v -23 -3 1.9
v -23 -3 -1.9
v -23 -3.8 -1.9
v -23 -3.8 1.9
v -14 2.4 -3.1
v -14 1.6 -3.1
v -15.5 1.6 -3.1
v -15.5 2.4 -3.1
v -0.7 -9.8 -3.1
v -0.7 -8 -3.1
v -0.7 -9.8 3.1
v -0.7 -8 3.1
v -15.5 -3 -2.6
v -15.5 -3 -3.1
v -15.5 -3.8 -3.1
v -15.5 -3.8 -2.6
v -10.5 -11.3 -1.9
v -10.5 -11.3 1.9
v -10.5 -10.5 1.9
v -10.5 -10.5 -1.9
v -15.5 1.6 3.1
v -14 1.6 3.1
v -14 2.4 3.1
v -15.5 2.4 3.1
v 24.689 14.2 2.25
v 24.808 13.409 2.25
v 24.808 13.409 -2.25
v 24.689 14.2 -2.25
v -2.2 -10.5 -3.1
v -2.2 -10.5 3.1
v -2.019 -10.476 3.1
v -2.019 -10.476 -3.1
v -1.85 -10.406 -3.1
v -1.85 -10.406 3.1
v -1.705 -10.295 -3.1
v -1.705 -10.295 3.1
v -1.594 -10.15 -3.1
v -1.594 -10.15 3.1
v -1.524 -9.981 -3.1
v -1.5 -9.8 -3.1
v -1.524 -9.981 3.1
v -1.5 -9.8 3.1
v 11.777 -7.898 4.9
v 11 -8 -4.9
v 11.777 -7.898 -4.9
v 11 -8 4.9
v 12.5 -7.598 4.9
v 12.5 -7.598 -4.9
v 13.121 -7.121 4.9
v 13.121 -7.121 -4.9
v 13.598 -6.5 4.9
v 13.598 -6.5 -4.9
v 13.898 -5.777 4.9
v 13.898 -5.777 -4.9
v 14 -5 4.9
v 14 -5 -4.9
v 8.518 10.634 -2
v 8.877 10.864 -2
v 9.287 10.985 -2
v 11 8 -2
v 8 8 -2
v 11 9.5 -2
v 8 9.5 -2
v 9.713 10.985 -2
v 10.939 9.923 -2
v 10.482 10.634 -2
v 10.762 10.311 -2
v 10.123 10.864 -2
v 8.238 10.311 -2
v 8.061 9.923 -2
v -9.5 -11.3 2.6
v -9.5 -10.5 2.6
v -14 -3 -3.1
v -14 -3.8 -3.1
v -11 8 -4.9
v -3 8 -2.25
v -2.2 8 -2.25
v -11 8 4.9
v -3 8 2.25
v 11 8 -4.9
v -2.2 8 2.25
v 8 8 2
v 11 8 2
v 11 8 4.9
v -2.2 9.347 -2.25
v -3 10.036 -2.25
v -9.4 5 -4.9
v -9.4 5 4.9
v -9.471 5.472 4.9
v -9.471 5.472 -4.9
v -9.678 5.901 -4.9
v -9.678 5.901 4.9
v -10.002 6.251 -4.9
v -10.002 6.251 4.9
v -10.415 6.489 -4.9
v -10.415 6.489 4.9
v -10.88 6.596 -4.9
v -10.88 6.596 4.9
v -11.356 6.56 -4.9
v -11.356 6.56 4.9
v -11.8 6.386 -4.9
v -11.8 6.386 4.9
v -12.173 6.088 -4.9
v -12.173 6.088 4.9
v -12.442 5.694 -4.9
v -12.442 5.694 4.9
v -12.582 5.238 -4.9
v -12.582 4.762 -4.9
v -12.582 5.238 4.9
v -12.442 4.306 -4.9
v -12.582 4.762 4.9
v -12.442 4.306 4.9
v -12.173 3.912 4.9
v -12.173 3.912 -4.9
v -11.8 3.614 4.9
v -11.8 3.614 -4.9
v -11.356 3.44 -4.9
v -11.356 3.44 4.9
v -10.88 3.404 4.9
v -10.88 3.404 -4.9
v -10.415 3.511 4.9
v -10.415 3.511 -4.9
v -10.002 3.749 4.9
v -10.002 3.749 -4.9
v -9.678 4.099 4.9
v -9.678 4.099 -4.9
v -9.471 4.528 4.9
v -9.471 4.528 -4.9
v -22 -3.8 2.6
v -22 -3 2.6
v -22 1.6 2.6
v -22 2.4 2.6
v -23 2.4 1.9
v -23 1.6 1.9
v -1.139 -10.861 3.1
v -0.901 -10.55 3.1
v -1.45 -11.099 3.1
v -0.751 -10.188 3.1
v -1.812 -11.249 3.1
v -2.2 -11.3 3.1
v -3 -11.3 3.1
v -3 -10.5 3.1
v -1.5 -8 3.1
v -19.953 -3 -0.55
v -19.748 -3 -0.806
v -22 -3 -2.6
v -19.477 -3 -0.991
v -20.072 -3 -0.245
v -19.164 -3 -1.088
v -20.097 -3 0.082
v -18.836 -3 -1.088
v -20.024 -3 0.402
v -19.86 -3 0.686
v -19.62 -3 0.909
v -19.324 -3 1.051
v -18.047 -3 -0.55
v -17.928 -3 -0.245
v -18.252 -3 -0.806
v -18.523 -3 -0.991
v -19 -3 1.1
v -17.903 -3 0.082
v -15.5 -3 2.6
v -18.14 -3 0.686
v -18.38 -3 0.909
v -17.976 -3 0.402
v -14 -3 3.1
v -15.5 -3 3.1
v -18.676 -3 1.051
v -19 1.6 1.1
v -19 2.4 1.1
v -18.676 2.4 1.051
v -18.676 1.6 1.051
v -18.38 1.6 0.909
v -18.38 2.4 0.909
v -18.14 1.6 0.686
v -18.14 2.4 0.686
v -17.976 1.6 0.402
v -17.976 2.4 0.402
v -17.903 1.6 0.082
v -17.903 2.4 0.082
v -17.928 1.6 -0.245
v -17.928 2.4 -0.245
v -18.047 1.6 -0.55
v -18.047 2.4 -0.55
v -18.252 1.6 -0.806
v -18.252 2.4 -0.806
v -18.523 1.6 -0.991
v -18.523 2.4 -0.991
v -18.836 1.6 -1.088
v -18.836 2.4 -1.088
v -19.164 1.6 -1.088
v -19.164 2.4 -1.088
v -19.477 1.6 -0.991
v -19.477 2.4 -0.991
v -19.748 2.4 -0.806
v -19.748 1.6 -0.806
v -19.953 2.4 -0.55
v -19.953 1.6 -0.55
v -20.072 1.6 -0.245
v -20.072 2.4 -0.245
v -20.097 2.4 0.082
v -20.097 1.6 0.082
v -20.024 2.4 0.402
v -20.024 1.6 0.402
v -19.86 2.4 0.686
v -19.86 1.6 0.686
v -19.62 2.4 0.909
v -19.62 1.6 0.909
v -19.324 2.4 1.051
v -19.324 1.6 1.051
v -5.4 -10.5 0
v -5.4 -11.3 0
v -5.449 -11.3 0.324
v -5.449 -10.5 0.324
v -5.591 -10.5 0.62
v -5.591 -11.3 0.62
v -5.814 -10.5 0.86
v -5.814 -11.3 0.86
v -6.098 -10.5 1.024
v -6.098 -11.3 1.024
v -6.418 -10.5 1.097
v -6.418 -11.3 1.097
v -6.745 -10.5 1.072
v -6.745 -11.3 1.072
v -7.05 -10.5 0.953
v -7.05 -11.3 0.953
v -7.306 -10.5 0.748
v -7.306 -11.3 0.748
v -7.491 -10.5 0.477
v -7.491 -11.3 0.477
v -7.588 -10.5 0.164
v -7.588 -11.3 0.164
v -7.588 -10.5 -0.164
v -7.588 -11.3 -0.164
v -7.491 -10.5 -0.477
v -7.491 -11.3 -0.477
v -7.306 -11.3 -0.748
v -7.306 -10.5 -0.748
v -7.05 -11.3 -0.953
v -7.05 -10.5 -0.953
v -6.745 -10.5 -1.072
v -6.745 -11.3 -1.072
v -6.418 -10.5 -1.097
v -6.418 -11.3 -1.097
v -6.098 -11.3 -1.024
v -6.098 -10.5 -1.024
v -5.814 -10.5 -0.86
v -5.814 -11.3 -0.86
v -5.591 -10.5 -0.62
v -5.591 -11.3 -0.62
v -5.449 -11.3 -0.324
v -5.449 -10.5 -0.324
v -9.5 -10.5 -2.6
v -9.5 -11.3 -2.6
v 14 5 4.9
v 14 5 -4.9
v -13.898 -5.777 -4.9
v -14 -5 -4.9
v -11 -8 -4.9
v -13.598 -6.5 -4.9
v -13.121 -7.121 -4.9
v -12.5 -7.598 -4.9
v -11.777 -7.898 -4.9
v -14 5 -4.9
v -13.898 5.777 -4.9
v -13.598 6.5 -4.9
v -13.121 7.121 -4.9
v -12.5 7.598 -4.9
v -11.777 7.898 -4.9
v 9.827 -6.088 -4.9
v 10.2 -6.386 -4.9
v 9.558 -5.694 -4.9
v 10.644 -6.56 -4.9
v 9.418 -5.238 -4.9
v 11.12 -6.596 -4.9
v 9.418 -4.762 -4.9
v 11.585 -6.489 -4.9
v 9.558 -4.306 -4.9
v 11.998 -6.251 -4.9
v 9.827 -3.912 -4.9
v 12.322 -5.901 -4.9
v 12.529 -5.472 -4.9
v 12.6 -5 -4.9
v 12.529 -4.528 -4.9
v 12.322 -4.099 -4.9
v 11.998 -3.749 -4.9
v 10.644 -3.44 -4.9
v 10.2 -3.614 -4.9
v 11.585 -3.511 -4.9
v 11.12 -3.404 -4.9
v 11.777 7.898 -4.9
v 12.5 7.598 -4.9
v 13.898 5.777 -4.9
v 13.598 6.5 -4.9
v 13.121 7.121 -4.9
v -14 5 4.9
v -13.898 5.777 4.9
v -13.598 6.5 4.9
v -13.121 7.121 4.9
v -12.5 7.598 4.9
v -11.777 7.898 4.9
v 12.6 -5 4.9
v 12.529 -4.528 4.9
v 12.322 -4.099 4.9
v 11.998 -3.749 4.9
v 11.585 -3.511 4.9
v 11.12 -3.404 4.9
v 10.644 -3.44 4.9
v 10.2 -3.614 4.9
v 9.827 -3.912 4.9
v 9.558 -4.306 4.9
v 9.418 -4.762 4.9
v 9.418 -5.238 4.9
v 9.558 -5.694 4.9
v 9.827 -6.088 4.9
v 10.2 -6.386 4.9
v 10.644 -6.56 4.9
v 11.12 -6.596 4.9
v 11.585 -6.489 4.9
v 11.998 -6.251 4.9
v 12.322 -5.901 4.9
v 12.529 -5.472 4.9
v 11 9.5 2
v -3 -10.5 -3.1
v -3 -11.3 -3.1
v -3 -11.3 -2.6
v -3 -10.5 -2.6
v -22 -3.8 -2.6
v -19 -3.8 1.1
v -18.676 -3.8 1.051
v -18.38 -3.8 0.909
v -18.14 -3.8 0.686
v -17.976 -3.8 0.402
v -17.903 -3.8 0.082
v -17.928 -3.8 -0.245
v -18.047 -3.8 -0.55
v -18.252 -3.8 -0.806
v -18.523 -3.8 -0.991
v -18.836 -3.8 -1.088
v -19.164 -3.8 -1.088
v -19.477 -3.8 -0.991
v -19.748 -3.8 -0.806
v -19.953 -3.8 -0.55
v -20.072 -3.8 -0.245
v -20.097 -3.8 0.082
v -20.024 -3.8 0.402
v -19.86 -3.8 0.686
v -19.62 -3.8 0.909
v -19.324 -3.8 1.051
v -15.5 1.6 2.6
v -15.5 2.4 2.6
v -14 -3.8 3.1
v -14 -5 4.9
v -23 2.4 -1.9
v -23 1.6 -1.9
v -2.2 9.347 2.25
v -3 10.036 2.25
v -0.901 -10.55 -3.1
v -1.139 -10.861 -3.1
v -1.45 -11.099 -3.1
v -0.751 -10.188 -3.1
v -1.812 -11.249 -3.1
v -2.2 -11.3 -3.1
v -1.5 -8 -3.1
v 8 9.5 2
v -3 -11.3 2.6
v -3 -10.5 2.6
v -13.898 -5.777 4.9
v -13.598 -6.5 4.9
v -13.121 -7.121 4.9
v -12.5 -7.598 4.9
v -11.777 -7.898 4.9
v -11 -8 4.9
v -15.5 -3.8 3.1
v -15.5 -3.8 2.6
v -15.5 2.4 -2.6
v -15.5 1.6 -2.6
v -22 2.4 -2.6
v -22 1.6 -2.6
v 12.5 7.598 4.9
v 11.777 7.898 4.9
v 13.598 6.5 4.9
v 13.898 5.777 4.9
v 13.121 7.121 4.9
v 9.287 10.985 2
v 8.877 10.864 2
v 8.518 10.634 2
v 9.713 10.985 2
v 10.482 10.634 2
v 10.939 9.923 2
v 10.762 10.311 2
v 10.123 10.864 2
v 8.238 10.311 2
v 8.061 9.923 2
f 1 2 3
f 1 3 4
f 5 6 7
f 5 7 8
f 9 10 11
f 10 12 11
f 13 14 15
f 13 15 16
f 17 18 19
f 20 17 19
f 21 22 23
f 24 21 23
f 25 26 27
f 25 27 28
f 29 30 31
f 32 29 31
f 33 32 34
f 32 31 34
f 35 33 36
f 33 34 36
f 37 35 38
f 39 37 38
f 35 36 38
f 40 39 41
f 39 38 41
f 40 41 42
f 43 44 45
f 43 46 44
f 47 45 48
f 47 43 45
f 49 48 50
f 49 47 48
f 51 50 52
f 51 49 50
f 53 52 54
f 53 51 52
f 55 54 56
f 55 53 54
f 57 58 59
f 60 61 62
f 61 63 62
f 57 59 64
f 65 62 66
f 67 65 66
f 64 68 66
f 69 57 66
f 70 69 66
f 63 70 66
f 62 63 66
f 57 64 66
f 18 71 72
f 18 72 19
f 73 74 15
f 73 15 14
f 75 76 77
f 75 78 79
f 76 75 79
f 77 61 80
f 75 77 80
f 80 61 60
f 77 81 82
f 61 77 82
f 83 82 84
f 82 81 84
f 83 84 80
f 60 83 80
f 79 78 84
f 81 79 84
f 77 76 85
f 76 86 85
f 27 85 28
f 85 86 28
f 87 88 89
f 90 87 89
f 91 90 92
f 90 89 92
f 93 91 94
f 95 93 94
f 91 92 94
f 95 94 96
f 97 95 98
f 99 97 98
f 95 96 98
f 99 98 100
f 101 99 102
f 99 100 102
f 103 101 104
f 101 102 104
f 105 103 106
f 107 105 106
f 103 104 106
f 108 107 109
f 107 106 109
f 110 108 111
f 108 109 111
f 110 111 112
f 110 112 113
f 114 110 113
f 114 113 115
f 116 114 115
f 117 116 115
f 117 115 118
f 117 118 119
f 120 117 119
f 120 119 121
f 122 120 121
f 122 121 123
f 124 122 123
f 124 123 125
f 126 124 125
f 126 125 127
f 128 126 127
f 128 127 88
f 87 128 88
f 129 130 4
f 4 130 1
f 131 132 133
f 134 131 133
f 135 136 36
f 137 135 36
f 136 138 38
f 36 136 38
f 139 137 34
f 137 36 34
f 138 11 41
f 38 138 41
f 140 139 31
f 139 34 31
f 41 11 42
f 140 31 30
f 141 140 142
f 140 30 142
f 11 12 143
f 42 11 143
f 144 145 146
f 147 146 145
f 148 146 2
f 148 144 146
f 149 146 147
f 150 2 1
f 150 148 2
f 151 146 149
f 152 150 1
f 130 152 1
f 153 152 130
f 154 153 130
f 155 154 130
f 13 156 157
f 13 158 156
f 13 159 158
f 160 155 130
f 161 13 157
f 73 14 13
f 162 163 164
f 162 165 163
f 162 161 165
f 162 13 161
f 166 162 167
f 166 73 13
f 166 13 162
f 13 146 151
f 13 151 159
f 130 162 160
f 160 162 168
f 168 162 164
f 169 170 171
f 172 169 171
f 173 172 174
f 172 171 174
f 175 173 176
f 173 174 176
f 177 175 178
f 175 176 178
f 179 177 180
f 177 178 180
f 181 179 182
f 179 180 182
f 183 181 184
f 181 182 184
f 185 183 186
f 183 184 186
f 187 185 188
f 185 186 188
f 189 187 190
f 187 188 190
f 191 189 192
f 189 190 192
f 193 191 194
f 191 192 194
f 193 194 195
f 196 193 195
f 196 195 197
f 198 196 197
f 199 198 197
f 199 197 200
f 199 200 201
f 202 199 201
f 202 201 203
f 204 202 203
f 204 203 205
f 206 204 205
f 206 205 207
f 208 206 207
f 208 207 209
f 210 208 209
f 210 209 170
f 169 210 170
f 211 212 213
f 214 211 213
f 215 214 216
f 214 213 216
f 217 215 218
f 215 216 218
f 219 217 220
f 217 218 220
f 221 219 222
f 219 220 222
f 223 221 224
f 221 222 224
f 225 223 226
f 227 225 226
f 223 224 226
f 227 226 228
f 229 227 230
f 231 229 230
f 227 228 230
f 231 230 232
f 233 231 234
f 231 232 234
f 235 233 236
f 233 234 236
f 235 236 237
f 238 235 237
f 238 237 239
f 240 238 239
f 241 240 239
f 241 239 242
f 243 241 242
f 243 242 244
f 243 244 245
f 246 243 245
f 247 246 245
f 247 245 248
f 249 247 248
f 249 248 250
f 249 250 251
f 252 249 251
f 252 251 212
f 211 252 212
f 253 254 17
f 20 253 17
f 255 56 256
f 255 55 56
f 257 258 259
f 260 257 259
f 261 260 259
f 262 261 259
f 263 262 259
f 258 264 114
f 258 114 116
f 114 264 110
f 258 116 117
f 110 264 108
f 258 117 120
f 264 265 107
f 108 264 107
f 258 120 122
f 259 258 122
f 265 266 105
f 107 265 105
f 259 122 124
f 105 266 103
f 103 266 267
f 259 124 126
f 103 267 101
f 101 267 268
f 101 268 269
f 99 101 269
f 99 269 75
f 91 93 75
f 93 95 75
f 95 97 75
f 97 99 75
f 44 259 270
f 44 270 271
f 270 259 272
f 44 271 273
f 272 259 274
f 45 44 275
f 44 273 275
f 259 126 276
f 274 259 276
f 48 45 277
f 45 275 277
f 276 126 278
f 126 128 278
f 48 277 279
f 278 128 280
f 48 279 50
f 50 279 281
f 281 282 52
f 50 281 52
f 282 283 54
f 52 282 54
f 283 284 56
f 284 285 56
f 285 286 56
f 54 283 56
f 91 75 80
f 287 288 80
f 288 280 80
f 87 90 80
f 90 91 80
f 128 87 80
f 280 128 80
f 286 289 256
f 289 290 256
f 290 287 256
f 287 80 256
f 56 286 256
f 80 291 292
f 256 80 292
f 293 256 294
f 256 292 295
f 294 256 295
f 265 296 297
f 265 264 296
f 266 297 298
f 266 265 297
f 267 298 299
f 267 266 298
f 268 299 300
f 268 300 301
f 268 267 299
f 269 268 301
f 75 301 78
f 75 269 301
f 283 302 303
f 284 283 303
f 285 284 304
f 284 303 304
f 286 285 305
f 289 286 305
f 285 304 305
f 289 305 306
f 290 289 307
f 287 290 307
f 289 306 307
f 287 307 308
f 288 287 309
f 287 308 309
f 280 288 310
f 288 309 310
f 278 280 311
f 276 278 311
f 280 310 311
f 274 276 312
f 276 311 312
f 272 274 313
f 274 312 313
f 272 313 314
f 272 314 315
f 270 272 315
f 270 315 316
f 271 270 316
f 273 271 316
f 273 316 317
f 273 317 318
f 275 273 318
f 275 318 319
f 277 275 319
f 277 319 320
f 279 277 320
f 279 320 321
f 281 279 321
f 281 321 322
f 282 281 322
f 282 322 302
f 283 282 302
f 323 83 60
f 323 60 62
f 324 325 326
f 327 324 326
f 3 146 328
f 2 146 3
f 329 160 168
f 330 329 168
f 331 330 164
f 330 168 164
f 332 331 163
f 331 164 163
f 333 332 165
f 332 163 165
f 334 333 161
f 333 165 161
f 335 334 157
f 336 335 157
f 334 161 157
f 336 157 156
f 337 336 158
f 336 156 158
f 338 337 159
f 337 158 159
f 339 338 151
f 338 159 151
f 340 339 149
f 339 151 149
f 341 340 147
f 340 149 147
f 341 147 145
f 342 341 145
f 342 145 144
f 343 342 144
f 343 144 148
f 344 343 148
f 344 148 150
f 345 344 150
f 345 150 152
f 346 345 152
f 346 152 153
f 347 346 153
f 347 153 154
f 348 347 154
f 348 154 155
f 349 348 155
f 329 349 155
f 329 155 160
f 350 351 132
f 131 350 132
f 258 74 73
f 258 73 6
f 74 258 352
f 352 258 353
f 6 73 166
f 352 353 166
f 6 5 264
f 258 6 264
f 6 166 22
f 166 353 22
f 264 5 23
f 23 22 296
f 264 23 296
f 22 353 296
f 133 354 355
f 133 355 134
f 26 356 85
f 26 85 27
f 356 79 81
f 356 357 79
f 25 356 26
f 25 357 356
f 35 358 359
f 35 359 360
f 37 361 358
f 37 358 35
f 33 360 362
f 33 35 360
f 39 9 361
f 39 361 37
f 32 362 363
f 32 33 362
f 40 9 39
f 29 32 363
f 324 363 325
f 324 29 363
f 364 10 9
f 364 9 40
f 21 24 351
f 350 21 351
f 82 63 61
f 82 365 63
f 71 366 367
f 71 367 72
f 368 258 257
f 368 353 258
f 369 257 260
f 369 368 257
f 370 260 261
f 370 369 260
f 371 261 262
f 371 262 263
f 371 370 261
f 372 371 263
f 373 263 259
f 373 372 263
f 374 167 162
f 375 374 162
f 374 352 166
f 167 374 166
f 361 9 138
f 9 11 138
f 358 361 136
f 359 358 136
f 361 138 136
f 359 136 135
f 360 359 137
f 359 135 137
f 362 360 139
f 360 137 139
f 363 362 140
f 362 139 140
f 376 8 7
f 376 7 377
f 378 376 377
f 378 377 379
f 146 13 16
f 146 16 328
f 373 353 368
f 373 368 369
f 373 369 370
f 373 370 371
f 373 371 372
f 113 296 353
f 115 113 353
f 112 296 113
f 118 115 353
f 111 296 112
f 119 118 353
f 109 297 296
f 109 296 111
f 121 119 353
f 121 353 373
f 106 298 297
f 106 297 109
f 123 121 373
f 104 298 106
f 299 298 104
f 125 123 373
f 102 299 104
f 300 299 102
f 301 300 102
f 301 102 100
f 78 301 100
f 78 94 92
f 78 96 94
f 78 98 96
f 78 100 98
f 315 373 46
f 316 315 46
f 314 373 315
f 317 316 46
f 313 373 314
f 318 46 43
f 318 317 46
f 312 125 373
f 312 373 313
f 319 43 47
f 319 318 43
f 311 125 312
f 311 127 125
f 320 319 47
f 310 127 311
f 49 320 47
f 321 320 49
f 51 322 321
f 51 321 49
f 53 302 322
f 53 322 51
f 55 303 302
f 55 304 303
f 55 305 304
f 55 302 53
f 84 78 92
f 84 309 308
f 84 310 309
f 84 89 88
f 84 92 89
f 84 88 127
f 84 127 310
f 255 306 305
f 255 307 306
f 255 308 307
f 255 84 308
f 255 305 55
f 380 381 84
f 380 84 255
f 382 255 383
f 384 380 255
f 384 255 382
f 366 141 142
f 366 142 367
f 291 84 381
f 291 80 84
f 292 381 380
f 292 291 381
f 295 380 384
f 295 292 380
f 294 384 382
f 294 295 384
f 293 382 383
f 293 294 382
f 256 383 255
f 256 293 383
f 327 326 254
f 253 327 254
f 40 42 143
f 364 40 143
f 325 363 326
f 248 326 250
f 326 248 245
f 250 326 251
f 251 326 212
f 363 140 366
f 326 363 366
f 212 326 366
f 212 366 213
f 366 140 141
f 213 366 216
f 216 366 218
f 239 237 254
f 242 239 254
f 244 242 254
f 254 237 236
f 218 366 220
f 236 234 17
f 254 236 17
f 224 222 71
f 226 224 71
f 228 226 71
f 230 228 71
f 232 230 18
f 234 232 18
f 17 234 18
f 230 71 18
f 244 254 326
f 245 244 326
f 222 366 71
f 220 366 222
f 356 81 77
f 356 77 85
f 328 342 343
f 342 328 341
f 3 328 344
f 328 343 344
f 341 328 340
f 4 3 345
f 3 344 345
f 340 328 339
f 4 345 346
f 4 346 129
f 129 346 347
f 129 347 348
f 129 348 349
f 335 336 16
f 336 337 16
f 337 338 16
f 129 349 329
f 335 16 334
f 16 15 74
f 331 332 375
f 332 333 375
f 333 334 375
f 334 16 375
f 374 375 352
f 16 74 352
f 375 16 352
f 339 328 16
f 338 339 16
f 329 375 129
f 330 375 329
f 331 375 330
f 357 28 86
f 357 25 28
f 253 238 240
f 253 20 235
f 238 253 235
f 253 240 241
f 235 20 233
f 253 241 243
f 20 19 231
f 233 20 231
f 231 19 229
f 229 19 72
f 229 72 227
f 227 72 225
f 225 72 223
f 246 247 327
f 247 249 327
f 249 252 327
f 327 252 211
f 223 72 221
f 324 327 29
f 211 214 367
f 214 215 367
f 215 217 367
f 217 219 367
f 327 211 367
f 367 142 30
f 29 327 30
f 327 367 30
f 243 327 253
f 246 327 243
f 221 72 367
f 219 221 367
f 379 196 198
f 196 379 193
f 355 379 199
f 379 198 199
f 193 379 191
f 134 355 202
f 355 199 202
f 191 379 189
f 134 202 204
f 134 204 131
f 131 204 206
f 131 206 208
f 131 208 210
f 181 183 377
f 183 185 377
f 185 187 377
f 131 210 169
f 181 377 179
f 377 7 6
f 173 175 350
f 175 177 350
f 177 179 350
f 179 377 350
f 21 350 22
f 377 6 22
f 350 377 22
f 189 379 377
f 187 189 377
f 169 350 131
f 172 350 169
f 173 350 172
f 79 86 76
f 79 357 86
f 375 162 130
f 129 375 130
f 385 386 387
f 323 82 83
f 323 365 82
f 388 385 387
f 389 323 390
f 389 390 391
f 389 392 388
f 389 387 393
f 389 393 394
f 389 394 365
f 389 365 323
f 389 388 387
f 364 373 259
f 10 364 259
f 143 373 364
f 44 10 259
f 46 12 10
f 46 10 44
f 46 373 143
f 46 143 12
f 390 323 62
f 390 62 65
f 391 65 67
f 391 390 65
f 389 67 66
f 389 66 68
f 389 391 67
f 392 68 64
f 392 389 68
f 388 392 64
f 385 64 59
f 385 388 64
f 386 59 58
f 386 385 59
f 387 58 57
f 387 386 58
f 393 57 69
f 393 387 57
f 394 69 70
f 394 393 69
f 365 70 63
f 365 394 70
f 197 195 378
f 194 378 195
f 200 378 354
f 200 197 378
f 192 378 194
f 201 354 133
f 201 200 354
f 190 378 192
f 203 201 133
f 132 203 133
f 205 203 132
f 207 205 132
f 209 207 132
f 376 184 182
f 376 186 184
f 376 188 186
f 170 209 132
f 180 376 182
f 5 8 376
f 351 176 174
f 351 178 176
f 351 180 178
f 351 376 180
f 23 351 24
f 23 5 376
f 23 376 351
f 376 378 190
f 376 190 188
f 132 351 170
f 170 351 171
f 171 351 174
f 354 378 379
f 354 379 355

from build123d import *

# Parameters (mm, degrees)
SKETCH_1_W          = 28
SKETCH_1_H          = 16
EXTRUDE_1_DEPTH     = 4.9
EXTRUDE_2_DEPTH     = 2
SKETCH_3_W          = 6.2
SKETCH_3_H          = 0.8
EXTRUDE_3_DEPTH     = 9
SKETCH_4_R          = 1.1
CUT_EXTRUDE_1_DEPTH = 26.713226169
EXTRUDE_4_DEPTH     = 3.1
CUT_EXTRUDE_2_REACH = 34.408
SKETCH_6_R          = 1.1
EXTRUDE_10_DEPTH    = 2.25
FILLET_1_R          = 3
SKETCH_8_R          = 1.6
CUT_EXTRUDE_3_DEPTH = 31.217464609


with BuildPart() as part:
    # 草图1 → 凸台-拉伸1 (new, symmetric)
    with BuildSketch(Plane.XY):
        Rectangle(SKETCH_1_W, SKETCH_1_H)
    extrude(amount=EXTRUDE_1_DEPTH, both=True)

    # 草图2 → 凸台-拉伸2 (add, symmetric)
    with BuildSketch(Plane.XY):
        with BuildLine():
            Line((8, 8), (11, 8))
            Line((11, 8), (11, 9.5))
            ThreePointArc((11, 9.5), (9.5, 11), (8, 9.5))
            Line((8, 9.5), (8, 8))
        make_face()
    extrude(amount=EXTRUDE_2_DEPTH, both=True)

    # 草图3 → 凸台-拉伸3 (add)
    with BuildSketch(Plane.ZY.offset(14)):
        with Locations((0, 2)):
            Rectangle(SKETCH_3_W, SKETCH_3_H)
        with Locations((0, -3.4)):
            Rectangle(SKETCH_3_W, SKETCH_3_H)
    extrude(amount=EXTRUDE_3_DEPTH)

    # 草图4 → 切除-拉伸1 (cut, through all)
    with BuildSketch(Plane(origin=(0, 2.4, 0), x_dir=(1, 0, 0), z_dir=(0, 1, 0))):
        with Locations(Location((-19, 0, 0), (0, 0, 270))):
            Circle(SKETCH_4_R)
        Polygon((-15.5, 3.1), (-15.5, 2.6), (-22, 2.6), (-23, 1.9), (-23, 3.1), align=None)
        Polygon((-23, -3.1), (-15.5, -3.1), (-15.5, -2.6), (-22, -2.6), (-23, -1.9), align=None)
    extrude(amount=-CUT_EXTRUDE_1_DEPTH, mode=Mode.SUBTRACT)

    # 草图5 → 凸台-拉伸4 (add, symmetric)
    with BuildSketch(Plane.XY):
        with BuildLine():
            Line((-1.5, -8), (-0.7, -8))
            Line((-0.7, -8), (-0.7, -9.8))
            ThreePointArc((-0.7, -9.8), (-1.139339828, -10.860660172), (-2.2, -11.3))
            Line((-2.2, -11.3), (-10.5, -11.3))
            Line((-10.5, -11.3), (-10.5, -10.5))
            Line((-10.5, -10.5), (-2.2, -10.5))
            ThreePointArc((-2.2, -10.5), (-1.705025253, -10.294974747), (-1.5, -9.8))
            Line((-1.5, -9.8), (-1.5, -8))
        make_face()
    extrude(amount=EXTRUDE_4_DEPTH, both=True)

    # 草图6 → 切除-拉伸2 (cut, up to next)
    with BuildSketch(Plane.XZ.offset(11.3), mode=Mode.PRIVATE) as cut_extrude_2_sk1:
        with Locations((-6.5, 0)):
            Circle(SKETCH_6_R)
    cut_extrude_2_tool1 = extrude(cut_extrude_2_sk1.sketch, amount=-CUT_EXTRUDE_2_REACH, mode=Mode.PRIVATE) & part.part
    # 草图6 → 切除-拉伸2 (cut, up to next)
    with BuildSketch(Plane.XZ.offset(11.3), mode=Mode.PRIVATE) as cut_extrude_2_sk2:
        Polygon((-3, 3.1), (-3, 2.6), (-9.5, 2.6), (-10.5, 1.9), (-10.5, 3.1), align=None)
    cut_extrude_2_tool2 = extrude(cut_extrude_2_sk2.sketch, amount=-CUT_EXTRUDE_2_REACH, mode=Mode.PRIVATE) & part.part
    # 草图6 → 切除-拉伸2 (cut, up to next)
    with BuildSketch(Plane.XZ.offset(11.3), mode=Mode.PRIVATE) as cut_extrude_2_sk3:
        Polygon((-10.5, -3.1), (-3, -3.1), (-3, -2.6), (-9.5, -2.6), (-10.5, -1.9), align=None)
    cut_extrude_2_tool3 = extrude(cut_extrude_2_sk3.sketch, amount=-CUT_EXTRUDE_2_REACH, mode=Mode.PRIVATE) & part.part
    add(cut_extrude_2_tool1.solids().sort_by_distance((-6.5, -11.3, 0))[0], mode=Mode.SUBTRACT)
    add(cut_extrude_2_tool2.solids().sort_by_distance((-7.041667, -11.3, 2.80874))[0], mode=Mode.SUBTRACT)
    add(cut_extrude_2_tool3.solids().sort_by_distance((-7.041667, -11.3, -2.80874))[0], mode=Mode.SUBTRACT)

    # 草图7 → 凸台-拉伸10 (add, symmetric)
    with BuildSketch(Plane.XY):
        Polygon((-3, 8), (-2.2, 8), (-2.2, 9.346877402), (24.807562706, 13.408897757), (24.6885785, 14.2), (-3, 10.035552778), align=None)
    extrude(amount=EXTRUDE_10_DEPTH, both=True)

    # 圆角1
    fillet_1_edges = [part.edges().sort_by_distance(p)[0] for p in [
        (14, -8, 0),
        (-14, -8, 0),
        (-14, 8, 0),
        (14, 8, 0),
    ]]
    fillet(fillet_1_edges, radius=FILLET_1_R - 0.0001)  # a hair under: the kernel refuses the full size

    # 草图8 → 切除-拉伸3 (cut, through all)
    with BuildSketch(Plane.XY.offset(4.9)):
        with Locations((-11, 5)):
            Circle(SKETCH_8_R)
        with Locations((11, -5)):
            Circle(SKETCH_8_R)
    extrude(amount=-CUT_EXTRUDE_3_DEPTH, mode=Mode.SUBTRACT)


solid = part.part
